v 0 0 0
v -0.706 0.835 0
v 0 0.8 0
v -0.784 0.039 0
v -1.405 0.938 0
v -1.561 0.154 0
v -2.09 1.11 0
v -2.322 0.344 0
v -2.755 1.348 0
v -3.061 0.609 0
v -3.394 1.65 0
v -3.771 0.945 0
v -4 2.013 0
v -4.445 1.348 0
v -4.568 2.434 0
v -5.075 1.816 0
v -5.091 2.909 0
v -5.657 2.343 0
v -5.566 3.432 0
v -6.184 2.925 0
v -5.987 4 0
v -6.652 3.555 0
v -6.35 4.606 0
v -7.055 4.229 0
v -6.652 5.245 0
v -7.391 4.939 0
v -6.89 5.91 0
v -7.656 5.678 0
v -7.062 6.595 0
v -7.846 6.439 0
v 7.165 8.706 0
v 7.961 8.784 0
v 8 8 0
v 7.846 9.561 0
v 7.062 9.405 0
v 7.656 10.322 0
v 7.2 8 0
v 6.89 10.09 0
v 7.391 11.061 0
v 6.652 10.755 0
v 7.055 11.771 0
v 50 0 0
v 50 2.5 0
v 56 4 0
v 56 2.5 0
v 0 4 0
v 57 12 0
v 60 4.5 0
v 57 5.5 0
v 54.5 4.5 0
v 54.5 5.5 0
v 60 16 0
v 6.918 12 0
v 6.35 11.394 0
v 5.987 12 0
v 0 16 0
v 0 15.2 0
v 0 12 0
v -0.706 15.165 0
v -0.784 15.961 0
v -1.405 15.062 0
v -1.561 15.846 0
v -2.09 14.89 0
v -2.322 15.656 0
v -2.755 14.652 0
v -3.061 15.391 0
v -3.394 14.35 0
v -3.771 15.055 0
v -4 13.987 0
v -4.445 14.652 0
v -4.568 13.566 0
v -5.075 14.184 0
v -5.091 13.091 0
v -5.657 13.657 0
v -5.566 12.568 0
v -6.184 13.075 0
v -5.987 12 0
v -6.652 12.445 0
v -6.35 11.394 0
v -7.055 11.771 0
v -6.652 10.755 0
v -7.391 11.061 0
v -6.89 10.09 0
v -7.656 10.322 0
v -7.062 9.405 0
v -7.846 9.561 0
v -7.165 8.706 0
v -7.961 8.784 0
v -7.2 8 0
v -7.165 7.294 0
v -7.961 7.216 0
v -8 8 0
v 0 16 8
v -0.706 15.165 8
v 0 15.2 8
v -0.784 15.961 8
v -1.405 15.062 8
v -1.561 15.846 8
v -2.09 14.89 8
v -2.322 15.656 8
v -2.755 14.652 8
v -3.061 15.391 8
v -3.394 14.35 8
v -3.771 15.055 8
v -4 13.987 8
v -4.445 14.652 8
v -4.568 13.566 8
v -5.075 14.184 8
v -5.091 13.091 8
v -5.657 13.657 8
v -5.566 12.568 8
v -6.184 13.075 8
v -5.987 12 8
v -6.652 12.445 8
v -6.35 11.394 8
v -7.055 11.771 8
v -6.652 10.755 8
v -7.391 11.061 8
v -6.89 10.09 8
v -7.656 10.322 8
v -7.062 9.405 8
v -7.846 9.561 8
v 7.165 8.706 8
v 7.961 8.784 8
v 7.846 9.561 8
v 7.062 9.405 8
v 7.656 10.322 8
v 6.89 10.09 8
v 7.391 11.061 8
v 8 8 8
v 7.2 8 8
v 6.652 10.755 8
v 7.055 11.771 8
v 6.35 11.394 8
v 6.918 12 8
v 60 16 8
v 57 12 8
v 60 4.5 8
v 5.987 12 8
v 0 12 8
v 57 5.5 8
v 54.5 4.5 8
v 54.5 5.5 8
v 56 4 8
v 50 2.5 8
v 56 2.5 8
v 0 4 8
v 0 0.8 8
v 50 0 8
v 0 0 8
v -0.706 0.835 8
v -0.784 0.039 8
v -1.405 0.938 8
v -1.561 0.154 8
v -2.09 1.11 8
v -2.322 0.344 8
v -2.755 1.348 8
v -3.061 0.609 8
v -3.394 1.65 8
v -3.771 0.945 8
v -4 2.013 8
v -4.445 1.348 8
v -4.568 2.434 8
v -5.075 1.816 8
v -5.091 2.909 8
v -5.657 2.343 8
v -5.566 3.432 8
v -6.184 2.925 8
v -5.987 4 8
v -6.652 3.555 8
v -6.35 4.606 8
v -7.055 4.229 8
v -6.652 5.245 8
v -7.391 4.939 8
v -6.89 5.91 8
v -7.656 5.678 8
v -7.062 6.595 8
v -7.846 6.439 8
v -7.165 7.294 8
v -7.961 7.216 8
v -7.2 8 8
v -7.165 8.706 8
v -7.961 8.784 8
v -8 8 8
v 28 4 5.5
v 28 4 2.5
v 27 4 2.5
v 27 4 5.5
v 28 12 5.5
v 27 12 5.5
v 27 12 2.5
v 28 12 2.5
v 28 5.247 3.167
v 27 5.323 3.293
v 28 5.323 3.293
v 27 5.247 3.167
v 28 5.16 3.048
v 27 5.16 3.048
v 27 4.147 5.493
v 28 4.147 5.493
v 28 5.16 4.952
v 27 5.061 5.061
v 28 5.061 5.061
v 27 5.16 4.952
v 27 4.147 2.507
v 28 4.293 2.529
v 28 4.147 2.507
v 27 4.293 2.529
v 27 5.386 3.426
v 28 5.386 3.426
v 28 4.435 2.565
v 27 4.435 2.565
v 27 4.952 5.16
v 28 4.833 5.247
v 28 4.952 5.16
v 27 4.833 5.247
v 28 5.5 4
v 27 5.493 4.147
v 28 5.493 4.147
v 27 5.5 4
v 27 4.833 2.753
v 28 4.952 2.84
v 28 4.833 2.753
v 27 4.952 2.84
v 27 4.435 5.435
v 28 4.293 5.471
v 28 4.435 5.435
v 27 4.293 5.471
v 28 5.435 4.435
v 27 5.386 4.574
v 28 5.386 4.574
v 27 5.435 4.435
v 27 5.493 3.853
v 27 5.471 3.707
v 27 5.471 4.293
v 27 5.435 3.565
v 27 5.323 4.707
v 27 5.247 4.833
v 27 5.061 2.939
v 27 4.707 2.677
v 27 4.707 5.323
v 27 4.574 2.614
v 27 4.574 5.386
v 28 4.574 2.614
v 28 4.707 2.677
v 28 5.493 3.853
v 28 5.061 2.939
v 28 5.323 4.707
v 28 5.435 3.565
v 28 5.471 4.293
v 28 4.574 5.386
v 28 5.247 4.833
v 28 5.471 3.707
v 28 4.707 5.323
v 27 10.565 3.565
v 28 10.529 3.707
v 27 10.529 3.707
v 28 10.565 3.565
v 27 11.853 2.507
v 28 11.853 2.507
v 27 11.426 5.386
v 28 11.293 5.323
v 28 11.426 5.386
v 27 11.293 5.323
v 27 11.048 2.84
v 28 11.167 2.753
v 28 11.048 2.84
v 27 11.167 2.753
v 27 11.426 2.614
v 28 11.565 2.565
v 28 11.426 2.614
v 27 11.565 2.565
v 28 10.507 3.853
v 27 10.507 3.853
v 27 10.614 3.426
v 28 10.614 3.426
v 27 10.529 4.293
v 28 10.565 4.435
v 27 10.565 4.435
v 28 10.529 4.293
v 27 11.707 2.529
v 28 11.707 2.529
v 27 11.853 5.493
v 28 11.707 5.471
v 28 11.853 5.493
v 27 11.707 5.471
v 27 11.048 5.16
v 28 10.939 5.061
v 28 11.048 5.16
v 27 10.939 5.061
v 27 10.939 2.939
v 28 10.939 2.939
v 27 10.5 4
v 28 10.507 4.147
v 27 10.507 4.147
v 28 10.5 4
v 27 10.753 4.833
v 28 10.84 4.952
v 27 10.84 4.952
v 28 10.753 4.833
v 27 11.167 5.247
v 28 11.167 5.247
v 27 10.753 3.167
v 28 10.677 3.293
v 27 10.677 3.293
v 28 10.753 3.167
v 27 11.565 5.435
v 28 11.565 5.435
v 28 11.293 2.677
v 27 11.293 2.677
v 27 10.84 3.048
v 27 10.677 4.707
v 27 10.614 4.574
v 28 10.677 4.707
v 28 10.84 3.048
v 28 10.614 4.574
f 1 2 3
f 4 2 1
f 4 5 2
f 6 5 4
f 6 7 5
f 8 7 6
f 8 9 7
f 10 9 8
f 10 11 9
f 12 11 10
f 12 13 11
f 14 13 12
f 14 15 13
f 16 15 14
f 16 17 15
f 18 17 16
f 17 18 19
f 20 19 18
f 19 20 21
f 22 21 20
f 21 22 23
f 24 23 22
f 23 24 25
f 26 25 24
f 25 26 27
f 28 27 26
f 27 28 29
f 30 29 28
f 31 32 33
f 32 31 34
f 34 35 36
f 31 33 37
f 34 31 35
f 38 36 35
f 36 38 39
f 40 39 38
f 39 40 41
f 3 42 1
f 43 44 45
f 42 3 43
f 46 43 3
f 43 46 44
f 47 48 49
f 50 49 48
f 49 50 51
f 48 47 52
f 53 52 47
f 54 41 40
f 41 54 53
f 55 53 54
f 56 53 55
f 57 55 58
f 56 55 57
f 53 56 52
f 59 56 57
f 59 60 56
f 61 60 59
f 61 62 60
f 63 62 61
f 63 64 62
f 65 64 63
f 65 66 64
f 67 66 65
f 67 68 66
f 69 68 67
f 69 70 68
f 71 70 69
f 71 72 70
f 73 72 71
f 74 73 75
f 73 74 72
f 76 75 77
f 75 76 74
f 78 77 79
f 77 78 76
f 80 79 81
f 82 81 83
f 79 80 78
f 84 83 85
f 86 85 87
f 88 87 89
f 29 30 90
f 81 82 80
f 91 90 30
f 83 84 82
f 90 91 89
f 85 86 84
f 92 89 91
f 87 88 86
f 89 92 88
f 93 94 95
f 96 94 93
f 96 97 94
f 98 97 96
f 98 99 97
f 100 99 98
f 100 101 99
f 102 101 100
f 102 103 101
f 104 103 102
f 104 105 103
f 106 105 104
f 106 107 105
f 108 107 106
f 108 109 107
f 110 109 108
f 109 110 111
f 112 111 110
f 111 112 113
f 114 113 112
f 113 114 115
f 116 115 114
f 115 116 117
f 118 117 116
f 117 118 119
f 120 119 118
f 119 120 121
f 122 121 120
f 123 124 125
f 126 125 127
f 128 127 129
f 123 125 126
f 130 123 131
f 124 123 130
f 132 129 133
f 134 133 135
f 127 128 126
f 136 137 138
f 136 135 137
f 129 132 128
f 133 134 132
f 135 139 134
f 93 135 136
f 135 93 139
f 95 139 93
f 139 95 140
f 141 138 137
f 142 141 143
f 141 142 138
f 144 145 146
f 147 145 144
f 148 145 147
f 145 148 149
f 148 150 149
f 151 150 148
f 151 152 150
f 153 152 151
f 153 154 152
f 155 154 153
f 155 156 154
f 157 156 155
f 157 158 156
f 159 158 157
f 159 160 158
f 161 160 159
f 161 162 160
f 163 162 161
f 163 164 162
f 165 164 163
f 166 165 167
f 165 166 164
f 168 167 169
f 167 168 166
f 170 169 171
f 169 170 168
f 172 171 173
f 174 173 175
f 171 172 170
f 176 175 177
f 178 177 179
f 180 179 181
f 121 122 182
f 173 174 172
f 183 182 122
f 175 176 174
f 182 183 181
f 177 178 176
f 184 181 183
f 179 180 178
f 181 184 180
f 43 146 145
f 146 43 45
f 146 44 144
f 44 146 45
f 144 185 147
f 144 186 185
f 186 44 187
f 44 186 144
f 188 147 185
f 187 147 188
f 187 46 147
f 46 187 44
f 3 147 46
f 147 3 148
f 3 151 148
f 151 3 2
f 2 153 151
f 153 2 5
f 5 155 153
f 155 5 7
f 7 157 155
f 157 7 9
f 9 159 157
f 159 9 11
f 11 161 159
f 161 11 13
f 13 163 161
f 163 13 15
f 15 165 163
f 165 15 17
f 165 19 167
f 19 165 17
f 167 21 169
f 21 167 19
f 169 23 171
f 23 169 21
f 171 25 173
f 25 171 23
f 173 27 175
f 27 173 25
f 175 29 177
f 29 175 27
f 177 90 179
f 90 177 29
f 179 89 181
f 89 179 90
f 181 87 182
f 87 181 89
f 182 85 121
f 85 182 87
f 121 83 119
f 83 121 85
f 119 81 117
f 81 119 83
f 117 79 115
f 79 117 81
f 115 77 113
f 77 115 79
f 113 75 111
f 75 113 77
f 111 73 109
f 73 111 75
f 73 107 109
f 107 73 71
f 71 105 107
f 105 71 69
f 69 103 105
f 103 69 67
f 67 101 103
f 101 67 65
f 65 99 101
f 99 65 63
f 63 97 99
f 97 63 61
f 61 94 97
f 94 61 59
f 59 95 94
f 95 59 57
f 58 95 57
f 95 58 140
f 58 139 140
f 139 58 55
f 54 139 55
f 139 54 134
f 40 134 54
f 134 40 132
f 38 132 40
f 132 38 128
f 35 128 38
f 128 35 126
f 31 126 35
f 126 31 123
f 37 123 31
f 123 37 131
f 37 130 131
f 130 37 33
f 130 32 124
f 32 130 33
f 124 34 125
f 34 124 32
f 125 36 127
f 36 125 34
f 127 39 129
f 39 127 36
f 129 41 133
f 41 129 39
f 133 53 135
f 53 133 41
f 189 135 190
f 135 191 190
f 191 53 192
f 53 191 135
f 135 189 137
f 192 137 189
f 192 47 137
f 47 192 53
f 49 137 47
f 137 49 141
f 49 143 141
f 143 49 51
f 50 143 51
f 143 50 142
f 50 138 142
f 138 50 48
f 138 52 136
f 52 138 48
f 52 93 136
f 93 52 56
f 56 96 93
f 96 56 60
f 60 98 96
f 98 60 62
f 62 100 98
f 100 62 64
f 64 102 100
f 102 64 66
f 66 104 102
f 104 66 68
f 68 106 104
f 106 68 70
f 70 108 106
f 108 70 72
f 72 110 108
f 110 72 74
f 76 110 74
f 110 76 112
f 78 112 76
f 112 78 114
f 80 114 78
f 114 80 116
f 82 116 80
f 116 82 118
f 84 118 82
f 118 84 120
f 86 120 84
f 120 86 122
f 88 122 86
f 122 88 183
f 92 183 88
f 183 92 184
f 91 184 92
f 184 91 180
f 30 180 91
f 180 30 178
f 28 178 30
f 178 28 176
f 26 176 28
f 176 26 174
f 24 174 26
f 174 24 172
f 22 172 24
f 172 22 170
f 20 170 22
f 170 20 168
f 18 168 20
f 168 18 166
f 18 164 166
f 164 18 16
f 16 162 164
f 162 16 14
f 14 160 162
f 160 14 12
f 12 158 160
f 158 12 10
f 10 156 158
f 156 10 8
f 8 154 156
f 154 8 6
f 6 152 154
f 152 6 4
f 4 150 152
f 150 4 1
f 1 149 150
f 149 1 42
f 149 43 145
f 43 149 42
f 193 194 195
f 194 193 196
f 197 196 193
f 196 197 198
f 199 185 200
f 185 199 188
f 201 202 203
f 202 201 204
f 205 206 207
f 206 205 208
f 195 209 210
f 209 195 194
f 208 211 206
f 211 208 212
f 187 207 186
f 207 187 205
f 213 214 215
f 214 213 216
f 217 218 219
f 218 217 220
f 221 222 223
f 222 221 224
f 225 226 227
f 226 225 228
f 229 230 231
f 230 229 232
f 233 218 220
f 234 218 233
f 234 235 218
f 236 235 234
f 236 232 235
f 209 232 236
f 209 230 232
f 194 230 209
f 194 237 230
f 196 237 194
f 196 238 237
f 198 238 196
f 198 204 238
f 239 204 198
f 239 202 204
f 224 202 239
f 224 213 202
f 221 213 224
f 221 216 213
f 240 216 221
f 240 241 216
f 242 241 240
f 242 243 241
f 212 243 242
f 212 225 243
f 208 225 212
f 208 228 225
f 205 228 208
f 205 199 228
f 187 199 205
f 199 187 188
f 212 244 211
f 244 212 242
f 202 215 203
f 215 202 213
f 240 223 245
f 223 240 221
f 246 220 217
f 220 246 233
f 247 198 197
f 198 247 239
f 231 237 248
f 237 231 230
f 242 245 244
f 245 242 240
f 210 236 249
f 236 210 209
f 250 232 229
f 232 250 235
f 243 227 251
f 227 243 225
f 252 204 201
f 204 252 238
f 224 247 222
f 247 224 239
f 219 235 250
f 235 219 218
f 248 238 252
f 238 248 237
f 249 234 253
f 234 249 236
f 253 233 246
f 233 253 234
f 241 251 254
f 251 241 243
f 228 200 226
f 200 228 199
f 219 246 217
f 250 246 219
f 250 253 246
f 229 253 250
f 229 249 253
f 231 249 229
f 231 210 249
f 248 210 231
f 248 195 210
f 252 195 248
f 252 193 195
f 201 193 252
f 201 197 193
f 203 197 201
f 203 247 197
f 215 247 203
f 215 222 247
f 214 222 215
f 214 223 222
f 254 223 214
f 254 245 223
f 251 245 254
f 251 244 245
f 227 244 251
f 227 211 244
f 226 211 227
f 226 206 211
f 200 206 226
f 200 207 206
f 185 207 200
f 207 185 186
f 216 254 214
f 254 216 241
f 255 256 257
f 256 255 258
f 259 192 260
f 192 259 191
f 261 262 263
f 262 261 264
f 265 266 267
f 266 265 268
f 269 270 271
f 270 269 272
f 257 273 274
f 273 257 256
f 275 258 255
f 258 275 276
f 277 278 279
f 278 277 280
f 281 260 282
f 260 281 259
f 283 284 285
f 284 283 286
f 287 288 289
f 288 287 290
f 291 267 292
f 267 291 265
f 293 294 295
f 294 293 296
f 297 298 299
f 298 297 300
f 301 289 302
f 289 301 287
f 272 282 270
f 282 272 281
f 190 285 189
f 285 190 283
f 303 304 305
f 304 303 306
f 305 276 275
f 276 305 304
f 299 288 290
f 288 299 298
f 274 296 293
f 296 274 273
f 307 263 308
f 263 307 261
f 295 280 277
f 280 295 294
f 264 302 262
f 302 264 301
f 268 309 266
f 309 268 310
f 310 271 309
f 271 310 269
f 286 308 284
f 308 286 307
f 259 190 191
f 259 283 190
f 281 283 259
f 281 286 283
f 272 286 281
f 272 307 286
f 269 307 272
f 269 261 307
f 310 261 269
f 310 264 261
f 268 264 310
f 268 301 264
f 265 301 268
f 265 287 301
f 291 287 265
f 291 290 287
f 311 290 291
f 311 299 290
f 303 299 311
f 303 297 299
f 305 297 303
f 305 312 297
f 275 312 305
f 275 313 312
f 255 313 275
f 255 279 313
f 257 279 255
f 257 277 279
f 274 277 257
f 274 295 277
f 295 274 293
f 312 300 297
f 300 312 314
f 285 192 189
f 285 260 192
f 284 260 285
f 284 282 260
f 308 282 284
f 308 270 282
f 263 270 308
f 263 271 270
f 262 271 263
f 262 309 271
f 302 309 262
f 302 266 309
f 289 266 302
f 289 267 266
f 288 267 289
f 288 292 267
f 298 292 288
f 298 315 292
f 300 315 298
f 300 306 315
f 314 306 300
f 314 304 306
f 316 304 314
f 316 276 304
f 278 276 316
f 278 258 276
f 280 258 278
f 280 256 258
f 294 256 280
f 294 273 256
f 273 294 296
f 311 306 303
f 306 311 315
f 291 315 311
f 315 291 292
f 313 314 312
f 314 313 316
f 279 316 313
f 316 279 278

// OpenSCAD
// Pinch clamp for silicone tubing (up to 6.4 mm)
// Corrected: Ridges are half-cylinders on the inner faces, 
// and the nose is a solid feature starting 0.5mm above the base.

// --- Dimensions ---
thickness    = 8.0;    // Extrusion height (Z)
lower_len    = 50.0;   // Length of lower jaw bar
lower_y_w    = 4.0;    // Width of lower jaw bar
lower_tongue_len = 6.0; // Length of lower tongue (50 to 56)
lower_tongue_y_start = 2.5;
lower_tongue_y_end   = 4.0;

upper_len    = 60.0;   // Length of upper jaw bar
upper_y_start = 12.0;
upper_y_end   = 16.0;

hinge_center_y = 8.0;
hinge_r_in     = 7.2;
hinge_r_out    = 8.0;

ridge_radius   = 1.5;
ridge_x_pos    = 27.5;
ridge_y_low    = 4.0;
ridge_y_high   = 12.0;

latch_leg_x_start = 57.0;
latch_leg_x_end   = 60.0;
latch_leg_y_start = 4.5;
latch_leg_y_end   = 12.0;

latch_nose_x_start = 54.5;
latch_nose_x_end   = 57.0;
latch_nose_y_start = 4.5;
latch_nose_y_end   = 5.5;
latch_nose_z_start = 0.5; // 0.5mm above the tongue (Z=0)
latch_nose_z_end   = 0.5 + 1.0; // Assuming 1mm thickness for the nose feature

$fn = 64;

module profile_2d() {
    // Lower Jaw Bar
    square([lower_len, lower_y_w]);
    
    // Lower Tongue
    translate([lower_len, lower_tongue_y_start])
        square([lower_tongue_len, lower_tongue_y_end - lower_tongue_y_start]);
    
    // Upper Jaw Bar
    translate([0, upper_y_start])
        square([upper_len, upper_y_end - upper_y_start]);
    
    // Hinge (Half-ring on the left side)
    difference() {
        translate([0, hinge_center_y])
            circle(r = hinge_r_out);
        translate([0, hinge_center_y])
            circle(r = hinge_r_in);
        // Cut the right half to make it a "half-ring" on the left side
        translate([0, -hinge_r_out])
            square([hinge_r_out, hinge_r_out * 2]);
    }
    
    // Latch Leg
    translate([latch_leg_x_start, latch_leg_y_start])
        square([latch_leg_x_end - latch_leg_x_start, latch_leg_y_end - latch_leg_y_start]);
    
    // Latch Nose (2D profile part)
    translate([latch_nose_x_start, latch_nose_y_start])
        square([latch_nose_x_end - latch_nose_x_start, latch_nose_y_end - latch_nose_y_start]);
}

// --- 3D Model Construction ---
union() {
    // 1. Main Body
    linear_extrude(height = thickness) {
        profile_2d();
    }

    // 2. Additive Pinch Ridges (Half-cylinders)
    // The ridge is "half-round" on the inner face.
    // We place a cylinder and subtract the part that is inside the jaw.
    // Or more simply, use a cylinder and rotate it.
    
    // Lower ridge
    translate([ridge_x_pos, ridge_y_low, thickness/2])
        rotate([0, 90, 0])
            cylinder(h = 1.0, r = ridge_radius, center = true);
            
    // Upper ridge
    translate([ridge_x_pos, ridge_y_high, thickness/2])
        rotate([0, 90, 0])
            cylinder(h = 1.0, r = ridge_radius, center = true);

    // 3. Additive Latch Nose
    // The nose is 0.5mm above the tongue.
    // We extrude the nose profile from Z=0.5 to Z=1.5 (1mm thick)
    translate([latch_nose_x_start, latch_nose_y_start, latch_nose_z_start])
        cube([latch_nose_x_end - latch_nose_x_start, 
              latch_nose_y_end - latch_nose_y_start, 
              1.0]);
}
